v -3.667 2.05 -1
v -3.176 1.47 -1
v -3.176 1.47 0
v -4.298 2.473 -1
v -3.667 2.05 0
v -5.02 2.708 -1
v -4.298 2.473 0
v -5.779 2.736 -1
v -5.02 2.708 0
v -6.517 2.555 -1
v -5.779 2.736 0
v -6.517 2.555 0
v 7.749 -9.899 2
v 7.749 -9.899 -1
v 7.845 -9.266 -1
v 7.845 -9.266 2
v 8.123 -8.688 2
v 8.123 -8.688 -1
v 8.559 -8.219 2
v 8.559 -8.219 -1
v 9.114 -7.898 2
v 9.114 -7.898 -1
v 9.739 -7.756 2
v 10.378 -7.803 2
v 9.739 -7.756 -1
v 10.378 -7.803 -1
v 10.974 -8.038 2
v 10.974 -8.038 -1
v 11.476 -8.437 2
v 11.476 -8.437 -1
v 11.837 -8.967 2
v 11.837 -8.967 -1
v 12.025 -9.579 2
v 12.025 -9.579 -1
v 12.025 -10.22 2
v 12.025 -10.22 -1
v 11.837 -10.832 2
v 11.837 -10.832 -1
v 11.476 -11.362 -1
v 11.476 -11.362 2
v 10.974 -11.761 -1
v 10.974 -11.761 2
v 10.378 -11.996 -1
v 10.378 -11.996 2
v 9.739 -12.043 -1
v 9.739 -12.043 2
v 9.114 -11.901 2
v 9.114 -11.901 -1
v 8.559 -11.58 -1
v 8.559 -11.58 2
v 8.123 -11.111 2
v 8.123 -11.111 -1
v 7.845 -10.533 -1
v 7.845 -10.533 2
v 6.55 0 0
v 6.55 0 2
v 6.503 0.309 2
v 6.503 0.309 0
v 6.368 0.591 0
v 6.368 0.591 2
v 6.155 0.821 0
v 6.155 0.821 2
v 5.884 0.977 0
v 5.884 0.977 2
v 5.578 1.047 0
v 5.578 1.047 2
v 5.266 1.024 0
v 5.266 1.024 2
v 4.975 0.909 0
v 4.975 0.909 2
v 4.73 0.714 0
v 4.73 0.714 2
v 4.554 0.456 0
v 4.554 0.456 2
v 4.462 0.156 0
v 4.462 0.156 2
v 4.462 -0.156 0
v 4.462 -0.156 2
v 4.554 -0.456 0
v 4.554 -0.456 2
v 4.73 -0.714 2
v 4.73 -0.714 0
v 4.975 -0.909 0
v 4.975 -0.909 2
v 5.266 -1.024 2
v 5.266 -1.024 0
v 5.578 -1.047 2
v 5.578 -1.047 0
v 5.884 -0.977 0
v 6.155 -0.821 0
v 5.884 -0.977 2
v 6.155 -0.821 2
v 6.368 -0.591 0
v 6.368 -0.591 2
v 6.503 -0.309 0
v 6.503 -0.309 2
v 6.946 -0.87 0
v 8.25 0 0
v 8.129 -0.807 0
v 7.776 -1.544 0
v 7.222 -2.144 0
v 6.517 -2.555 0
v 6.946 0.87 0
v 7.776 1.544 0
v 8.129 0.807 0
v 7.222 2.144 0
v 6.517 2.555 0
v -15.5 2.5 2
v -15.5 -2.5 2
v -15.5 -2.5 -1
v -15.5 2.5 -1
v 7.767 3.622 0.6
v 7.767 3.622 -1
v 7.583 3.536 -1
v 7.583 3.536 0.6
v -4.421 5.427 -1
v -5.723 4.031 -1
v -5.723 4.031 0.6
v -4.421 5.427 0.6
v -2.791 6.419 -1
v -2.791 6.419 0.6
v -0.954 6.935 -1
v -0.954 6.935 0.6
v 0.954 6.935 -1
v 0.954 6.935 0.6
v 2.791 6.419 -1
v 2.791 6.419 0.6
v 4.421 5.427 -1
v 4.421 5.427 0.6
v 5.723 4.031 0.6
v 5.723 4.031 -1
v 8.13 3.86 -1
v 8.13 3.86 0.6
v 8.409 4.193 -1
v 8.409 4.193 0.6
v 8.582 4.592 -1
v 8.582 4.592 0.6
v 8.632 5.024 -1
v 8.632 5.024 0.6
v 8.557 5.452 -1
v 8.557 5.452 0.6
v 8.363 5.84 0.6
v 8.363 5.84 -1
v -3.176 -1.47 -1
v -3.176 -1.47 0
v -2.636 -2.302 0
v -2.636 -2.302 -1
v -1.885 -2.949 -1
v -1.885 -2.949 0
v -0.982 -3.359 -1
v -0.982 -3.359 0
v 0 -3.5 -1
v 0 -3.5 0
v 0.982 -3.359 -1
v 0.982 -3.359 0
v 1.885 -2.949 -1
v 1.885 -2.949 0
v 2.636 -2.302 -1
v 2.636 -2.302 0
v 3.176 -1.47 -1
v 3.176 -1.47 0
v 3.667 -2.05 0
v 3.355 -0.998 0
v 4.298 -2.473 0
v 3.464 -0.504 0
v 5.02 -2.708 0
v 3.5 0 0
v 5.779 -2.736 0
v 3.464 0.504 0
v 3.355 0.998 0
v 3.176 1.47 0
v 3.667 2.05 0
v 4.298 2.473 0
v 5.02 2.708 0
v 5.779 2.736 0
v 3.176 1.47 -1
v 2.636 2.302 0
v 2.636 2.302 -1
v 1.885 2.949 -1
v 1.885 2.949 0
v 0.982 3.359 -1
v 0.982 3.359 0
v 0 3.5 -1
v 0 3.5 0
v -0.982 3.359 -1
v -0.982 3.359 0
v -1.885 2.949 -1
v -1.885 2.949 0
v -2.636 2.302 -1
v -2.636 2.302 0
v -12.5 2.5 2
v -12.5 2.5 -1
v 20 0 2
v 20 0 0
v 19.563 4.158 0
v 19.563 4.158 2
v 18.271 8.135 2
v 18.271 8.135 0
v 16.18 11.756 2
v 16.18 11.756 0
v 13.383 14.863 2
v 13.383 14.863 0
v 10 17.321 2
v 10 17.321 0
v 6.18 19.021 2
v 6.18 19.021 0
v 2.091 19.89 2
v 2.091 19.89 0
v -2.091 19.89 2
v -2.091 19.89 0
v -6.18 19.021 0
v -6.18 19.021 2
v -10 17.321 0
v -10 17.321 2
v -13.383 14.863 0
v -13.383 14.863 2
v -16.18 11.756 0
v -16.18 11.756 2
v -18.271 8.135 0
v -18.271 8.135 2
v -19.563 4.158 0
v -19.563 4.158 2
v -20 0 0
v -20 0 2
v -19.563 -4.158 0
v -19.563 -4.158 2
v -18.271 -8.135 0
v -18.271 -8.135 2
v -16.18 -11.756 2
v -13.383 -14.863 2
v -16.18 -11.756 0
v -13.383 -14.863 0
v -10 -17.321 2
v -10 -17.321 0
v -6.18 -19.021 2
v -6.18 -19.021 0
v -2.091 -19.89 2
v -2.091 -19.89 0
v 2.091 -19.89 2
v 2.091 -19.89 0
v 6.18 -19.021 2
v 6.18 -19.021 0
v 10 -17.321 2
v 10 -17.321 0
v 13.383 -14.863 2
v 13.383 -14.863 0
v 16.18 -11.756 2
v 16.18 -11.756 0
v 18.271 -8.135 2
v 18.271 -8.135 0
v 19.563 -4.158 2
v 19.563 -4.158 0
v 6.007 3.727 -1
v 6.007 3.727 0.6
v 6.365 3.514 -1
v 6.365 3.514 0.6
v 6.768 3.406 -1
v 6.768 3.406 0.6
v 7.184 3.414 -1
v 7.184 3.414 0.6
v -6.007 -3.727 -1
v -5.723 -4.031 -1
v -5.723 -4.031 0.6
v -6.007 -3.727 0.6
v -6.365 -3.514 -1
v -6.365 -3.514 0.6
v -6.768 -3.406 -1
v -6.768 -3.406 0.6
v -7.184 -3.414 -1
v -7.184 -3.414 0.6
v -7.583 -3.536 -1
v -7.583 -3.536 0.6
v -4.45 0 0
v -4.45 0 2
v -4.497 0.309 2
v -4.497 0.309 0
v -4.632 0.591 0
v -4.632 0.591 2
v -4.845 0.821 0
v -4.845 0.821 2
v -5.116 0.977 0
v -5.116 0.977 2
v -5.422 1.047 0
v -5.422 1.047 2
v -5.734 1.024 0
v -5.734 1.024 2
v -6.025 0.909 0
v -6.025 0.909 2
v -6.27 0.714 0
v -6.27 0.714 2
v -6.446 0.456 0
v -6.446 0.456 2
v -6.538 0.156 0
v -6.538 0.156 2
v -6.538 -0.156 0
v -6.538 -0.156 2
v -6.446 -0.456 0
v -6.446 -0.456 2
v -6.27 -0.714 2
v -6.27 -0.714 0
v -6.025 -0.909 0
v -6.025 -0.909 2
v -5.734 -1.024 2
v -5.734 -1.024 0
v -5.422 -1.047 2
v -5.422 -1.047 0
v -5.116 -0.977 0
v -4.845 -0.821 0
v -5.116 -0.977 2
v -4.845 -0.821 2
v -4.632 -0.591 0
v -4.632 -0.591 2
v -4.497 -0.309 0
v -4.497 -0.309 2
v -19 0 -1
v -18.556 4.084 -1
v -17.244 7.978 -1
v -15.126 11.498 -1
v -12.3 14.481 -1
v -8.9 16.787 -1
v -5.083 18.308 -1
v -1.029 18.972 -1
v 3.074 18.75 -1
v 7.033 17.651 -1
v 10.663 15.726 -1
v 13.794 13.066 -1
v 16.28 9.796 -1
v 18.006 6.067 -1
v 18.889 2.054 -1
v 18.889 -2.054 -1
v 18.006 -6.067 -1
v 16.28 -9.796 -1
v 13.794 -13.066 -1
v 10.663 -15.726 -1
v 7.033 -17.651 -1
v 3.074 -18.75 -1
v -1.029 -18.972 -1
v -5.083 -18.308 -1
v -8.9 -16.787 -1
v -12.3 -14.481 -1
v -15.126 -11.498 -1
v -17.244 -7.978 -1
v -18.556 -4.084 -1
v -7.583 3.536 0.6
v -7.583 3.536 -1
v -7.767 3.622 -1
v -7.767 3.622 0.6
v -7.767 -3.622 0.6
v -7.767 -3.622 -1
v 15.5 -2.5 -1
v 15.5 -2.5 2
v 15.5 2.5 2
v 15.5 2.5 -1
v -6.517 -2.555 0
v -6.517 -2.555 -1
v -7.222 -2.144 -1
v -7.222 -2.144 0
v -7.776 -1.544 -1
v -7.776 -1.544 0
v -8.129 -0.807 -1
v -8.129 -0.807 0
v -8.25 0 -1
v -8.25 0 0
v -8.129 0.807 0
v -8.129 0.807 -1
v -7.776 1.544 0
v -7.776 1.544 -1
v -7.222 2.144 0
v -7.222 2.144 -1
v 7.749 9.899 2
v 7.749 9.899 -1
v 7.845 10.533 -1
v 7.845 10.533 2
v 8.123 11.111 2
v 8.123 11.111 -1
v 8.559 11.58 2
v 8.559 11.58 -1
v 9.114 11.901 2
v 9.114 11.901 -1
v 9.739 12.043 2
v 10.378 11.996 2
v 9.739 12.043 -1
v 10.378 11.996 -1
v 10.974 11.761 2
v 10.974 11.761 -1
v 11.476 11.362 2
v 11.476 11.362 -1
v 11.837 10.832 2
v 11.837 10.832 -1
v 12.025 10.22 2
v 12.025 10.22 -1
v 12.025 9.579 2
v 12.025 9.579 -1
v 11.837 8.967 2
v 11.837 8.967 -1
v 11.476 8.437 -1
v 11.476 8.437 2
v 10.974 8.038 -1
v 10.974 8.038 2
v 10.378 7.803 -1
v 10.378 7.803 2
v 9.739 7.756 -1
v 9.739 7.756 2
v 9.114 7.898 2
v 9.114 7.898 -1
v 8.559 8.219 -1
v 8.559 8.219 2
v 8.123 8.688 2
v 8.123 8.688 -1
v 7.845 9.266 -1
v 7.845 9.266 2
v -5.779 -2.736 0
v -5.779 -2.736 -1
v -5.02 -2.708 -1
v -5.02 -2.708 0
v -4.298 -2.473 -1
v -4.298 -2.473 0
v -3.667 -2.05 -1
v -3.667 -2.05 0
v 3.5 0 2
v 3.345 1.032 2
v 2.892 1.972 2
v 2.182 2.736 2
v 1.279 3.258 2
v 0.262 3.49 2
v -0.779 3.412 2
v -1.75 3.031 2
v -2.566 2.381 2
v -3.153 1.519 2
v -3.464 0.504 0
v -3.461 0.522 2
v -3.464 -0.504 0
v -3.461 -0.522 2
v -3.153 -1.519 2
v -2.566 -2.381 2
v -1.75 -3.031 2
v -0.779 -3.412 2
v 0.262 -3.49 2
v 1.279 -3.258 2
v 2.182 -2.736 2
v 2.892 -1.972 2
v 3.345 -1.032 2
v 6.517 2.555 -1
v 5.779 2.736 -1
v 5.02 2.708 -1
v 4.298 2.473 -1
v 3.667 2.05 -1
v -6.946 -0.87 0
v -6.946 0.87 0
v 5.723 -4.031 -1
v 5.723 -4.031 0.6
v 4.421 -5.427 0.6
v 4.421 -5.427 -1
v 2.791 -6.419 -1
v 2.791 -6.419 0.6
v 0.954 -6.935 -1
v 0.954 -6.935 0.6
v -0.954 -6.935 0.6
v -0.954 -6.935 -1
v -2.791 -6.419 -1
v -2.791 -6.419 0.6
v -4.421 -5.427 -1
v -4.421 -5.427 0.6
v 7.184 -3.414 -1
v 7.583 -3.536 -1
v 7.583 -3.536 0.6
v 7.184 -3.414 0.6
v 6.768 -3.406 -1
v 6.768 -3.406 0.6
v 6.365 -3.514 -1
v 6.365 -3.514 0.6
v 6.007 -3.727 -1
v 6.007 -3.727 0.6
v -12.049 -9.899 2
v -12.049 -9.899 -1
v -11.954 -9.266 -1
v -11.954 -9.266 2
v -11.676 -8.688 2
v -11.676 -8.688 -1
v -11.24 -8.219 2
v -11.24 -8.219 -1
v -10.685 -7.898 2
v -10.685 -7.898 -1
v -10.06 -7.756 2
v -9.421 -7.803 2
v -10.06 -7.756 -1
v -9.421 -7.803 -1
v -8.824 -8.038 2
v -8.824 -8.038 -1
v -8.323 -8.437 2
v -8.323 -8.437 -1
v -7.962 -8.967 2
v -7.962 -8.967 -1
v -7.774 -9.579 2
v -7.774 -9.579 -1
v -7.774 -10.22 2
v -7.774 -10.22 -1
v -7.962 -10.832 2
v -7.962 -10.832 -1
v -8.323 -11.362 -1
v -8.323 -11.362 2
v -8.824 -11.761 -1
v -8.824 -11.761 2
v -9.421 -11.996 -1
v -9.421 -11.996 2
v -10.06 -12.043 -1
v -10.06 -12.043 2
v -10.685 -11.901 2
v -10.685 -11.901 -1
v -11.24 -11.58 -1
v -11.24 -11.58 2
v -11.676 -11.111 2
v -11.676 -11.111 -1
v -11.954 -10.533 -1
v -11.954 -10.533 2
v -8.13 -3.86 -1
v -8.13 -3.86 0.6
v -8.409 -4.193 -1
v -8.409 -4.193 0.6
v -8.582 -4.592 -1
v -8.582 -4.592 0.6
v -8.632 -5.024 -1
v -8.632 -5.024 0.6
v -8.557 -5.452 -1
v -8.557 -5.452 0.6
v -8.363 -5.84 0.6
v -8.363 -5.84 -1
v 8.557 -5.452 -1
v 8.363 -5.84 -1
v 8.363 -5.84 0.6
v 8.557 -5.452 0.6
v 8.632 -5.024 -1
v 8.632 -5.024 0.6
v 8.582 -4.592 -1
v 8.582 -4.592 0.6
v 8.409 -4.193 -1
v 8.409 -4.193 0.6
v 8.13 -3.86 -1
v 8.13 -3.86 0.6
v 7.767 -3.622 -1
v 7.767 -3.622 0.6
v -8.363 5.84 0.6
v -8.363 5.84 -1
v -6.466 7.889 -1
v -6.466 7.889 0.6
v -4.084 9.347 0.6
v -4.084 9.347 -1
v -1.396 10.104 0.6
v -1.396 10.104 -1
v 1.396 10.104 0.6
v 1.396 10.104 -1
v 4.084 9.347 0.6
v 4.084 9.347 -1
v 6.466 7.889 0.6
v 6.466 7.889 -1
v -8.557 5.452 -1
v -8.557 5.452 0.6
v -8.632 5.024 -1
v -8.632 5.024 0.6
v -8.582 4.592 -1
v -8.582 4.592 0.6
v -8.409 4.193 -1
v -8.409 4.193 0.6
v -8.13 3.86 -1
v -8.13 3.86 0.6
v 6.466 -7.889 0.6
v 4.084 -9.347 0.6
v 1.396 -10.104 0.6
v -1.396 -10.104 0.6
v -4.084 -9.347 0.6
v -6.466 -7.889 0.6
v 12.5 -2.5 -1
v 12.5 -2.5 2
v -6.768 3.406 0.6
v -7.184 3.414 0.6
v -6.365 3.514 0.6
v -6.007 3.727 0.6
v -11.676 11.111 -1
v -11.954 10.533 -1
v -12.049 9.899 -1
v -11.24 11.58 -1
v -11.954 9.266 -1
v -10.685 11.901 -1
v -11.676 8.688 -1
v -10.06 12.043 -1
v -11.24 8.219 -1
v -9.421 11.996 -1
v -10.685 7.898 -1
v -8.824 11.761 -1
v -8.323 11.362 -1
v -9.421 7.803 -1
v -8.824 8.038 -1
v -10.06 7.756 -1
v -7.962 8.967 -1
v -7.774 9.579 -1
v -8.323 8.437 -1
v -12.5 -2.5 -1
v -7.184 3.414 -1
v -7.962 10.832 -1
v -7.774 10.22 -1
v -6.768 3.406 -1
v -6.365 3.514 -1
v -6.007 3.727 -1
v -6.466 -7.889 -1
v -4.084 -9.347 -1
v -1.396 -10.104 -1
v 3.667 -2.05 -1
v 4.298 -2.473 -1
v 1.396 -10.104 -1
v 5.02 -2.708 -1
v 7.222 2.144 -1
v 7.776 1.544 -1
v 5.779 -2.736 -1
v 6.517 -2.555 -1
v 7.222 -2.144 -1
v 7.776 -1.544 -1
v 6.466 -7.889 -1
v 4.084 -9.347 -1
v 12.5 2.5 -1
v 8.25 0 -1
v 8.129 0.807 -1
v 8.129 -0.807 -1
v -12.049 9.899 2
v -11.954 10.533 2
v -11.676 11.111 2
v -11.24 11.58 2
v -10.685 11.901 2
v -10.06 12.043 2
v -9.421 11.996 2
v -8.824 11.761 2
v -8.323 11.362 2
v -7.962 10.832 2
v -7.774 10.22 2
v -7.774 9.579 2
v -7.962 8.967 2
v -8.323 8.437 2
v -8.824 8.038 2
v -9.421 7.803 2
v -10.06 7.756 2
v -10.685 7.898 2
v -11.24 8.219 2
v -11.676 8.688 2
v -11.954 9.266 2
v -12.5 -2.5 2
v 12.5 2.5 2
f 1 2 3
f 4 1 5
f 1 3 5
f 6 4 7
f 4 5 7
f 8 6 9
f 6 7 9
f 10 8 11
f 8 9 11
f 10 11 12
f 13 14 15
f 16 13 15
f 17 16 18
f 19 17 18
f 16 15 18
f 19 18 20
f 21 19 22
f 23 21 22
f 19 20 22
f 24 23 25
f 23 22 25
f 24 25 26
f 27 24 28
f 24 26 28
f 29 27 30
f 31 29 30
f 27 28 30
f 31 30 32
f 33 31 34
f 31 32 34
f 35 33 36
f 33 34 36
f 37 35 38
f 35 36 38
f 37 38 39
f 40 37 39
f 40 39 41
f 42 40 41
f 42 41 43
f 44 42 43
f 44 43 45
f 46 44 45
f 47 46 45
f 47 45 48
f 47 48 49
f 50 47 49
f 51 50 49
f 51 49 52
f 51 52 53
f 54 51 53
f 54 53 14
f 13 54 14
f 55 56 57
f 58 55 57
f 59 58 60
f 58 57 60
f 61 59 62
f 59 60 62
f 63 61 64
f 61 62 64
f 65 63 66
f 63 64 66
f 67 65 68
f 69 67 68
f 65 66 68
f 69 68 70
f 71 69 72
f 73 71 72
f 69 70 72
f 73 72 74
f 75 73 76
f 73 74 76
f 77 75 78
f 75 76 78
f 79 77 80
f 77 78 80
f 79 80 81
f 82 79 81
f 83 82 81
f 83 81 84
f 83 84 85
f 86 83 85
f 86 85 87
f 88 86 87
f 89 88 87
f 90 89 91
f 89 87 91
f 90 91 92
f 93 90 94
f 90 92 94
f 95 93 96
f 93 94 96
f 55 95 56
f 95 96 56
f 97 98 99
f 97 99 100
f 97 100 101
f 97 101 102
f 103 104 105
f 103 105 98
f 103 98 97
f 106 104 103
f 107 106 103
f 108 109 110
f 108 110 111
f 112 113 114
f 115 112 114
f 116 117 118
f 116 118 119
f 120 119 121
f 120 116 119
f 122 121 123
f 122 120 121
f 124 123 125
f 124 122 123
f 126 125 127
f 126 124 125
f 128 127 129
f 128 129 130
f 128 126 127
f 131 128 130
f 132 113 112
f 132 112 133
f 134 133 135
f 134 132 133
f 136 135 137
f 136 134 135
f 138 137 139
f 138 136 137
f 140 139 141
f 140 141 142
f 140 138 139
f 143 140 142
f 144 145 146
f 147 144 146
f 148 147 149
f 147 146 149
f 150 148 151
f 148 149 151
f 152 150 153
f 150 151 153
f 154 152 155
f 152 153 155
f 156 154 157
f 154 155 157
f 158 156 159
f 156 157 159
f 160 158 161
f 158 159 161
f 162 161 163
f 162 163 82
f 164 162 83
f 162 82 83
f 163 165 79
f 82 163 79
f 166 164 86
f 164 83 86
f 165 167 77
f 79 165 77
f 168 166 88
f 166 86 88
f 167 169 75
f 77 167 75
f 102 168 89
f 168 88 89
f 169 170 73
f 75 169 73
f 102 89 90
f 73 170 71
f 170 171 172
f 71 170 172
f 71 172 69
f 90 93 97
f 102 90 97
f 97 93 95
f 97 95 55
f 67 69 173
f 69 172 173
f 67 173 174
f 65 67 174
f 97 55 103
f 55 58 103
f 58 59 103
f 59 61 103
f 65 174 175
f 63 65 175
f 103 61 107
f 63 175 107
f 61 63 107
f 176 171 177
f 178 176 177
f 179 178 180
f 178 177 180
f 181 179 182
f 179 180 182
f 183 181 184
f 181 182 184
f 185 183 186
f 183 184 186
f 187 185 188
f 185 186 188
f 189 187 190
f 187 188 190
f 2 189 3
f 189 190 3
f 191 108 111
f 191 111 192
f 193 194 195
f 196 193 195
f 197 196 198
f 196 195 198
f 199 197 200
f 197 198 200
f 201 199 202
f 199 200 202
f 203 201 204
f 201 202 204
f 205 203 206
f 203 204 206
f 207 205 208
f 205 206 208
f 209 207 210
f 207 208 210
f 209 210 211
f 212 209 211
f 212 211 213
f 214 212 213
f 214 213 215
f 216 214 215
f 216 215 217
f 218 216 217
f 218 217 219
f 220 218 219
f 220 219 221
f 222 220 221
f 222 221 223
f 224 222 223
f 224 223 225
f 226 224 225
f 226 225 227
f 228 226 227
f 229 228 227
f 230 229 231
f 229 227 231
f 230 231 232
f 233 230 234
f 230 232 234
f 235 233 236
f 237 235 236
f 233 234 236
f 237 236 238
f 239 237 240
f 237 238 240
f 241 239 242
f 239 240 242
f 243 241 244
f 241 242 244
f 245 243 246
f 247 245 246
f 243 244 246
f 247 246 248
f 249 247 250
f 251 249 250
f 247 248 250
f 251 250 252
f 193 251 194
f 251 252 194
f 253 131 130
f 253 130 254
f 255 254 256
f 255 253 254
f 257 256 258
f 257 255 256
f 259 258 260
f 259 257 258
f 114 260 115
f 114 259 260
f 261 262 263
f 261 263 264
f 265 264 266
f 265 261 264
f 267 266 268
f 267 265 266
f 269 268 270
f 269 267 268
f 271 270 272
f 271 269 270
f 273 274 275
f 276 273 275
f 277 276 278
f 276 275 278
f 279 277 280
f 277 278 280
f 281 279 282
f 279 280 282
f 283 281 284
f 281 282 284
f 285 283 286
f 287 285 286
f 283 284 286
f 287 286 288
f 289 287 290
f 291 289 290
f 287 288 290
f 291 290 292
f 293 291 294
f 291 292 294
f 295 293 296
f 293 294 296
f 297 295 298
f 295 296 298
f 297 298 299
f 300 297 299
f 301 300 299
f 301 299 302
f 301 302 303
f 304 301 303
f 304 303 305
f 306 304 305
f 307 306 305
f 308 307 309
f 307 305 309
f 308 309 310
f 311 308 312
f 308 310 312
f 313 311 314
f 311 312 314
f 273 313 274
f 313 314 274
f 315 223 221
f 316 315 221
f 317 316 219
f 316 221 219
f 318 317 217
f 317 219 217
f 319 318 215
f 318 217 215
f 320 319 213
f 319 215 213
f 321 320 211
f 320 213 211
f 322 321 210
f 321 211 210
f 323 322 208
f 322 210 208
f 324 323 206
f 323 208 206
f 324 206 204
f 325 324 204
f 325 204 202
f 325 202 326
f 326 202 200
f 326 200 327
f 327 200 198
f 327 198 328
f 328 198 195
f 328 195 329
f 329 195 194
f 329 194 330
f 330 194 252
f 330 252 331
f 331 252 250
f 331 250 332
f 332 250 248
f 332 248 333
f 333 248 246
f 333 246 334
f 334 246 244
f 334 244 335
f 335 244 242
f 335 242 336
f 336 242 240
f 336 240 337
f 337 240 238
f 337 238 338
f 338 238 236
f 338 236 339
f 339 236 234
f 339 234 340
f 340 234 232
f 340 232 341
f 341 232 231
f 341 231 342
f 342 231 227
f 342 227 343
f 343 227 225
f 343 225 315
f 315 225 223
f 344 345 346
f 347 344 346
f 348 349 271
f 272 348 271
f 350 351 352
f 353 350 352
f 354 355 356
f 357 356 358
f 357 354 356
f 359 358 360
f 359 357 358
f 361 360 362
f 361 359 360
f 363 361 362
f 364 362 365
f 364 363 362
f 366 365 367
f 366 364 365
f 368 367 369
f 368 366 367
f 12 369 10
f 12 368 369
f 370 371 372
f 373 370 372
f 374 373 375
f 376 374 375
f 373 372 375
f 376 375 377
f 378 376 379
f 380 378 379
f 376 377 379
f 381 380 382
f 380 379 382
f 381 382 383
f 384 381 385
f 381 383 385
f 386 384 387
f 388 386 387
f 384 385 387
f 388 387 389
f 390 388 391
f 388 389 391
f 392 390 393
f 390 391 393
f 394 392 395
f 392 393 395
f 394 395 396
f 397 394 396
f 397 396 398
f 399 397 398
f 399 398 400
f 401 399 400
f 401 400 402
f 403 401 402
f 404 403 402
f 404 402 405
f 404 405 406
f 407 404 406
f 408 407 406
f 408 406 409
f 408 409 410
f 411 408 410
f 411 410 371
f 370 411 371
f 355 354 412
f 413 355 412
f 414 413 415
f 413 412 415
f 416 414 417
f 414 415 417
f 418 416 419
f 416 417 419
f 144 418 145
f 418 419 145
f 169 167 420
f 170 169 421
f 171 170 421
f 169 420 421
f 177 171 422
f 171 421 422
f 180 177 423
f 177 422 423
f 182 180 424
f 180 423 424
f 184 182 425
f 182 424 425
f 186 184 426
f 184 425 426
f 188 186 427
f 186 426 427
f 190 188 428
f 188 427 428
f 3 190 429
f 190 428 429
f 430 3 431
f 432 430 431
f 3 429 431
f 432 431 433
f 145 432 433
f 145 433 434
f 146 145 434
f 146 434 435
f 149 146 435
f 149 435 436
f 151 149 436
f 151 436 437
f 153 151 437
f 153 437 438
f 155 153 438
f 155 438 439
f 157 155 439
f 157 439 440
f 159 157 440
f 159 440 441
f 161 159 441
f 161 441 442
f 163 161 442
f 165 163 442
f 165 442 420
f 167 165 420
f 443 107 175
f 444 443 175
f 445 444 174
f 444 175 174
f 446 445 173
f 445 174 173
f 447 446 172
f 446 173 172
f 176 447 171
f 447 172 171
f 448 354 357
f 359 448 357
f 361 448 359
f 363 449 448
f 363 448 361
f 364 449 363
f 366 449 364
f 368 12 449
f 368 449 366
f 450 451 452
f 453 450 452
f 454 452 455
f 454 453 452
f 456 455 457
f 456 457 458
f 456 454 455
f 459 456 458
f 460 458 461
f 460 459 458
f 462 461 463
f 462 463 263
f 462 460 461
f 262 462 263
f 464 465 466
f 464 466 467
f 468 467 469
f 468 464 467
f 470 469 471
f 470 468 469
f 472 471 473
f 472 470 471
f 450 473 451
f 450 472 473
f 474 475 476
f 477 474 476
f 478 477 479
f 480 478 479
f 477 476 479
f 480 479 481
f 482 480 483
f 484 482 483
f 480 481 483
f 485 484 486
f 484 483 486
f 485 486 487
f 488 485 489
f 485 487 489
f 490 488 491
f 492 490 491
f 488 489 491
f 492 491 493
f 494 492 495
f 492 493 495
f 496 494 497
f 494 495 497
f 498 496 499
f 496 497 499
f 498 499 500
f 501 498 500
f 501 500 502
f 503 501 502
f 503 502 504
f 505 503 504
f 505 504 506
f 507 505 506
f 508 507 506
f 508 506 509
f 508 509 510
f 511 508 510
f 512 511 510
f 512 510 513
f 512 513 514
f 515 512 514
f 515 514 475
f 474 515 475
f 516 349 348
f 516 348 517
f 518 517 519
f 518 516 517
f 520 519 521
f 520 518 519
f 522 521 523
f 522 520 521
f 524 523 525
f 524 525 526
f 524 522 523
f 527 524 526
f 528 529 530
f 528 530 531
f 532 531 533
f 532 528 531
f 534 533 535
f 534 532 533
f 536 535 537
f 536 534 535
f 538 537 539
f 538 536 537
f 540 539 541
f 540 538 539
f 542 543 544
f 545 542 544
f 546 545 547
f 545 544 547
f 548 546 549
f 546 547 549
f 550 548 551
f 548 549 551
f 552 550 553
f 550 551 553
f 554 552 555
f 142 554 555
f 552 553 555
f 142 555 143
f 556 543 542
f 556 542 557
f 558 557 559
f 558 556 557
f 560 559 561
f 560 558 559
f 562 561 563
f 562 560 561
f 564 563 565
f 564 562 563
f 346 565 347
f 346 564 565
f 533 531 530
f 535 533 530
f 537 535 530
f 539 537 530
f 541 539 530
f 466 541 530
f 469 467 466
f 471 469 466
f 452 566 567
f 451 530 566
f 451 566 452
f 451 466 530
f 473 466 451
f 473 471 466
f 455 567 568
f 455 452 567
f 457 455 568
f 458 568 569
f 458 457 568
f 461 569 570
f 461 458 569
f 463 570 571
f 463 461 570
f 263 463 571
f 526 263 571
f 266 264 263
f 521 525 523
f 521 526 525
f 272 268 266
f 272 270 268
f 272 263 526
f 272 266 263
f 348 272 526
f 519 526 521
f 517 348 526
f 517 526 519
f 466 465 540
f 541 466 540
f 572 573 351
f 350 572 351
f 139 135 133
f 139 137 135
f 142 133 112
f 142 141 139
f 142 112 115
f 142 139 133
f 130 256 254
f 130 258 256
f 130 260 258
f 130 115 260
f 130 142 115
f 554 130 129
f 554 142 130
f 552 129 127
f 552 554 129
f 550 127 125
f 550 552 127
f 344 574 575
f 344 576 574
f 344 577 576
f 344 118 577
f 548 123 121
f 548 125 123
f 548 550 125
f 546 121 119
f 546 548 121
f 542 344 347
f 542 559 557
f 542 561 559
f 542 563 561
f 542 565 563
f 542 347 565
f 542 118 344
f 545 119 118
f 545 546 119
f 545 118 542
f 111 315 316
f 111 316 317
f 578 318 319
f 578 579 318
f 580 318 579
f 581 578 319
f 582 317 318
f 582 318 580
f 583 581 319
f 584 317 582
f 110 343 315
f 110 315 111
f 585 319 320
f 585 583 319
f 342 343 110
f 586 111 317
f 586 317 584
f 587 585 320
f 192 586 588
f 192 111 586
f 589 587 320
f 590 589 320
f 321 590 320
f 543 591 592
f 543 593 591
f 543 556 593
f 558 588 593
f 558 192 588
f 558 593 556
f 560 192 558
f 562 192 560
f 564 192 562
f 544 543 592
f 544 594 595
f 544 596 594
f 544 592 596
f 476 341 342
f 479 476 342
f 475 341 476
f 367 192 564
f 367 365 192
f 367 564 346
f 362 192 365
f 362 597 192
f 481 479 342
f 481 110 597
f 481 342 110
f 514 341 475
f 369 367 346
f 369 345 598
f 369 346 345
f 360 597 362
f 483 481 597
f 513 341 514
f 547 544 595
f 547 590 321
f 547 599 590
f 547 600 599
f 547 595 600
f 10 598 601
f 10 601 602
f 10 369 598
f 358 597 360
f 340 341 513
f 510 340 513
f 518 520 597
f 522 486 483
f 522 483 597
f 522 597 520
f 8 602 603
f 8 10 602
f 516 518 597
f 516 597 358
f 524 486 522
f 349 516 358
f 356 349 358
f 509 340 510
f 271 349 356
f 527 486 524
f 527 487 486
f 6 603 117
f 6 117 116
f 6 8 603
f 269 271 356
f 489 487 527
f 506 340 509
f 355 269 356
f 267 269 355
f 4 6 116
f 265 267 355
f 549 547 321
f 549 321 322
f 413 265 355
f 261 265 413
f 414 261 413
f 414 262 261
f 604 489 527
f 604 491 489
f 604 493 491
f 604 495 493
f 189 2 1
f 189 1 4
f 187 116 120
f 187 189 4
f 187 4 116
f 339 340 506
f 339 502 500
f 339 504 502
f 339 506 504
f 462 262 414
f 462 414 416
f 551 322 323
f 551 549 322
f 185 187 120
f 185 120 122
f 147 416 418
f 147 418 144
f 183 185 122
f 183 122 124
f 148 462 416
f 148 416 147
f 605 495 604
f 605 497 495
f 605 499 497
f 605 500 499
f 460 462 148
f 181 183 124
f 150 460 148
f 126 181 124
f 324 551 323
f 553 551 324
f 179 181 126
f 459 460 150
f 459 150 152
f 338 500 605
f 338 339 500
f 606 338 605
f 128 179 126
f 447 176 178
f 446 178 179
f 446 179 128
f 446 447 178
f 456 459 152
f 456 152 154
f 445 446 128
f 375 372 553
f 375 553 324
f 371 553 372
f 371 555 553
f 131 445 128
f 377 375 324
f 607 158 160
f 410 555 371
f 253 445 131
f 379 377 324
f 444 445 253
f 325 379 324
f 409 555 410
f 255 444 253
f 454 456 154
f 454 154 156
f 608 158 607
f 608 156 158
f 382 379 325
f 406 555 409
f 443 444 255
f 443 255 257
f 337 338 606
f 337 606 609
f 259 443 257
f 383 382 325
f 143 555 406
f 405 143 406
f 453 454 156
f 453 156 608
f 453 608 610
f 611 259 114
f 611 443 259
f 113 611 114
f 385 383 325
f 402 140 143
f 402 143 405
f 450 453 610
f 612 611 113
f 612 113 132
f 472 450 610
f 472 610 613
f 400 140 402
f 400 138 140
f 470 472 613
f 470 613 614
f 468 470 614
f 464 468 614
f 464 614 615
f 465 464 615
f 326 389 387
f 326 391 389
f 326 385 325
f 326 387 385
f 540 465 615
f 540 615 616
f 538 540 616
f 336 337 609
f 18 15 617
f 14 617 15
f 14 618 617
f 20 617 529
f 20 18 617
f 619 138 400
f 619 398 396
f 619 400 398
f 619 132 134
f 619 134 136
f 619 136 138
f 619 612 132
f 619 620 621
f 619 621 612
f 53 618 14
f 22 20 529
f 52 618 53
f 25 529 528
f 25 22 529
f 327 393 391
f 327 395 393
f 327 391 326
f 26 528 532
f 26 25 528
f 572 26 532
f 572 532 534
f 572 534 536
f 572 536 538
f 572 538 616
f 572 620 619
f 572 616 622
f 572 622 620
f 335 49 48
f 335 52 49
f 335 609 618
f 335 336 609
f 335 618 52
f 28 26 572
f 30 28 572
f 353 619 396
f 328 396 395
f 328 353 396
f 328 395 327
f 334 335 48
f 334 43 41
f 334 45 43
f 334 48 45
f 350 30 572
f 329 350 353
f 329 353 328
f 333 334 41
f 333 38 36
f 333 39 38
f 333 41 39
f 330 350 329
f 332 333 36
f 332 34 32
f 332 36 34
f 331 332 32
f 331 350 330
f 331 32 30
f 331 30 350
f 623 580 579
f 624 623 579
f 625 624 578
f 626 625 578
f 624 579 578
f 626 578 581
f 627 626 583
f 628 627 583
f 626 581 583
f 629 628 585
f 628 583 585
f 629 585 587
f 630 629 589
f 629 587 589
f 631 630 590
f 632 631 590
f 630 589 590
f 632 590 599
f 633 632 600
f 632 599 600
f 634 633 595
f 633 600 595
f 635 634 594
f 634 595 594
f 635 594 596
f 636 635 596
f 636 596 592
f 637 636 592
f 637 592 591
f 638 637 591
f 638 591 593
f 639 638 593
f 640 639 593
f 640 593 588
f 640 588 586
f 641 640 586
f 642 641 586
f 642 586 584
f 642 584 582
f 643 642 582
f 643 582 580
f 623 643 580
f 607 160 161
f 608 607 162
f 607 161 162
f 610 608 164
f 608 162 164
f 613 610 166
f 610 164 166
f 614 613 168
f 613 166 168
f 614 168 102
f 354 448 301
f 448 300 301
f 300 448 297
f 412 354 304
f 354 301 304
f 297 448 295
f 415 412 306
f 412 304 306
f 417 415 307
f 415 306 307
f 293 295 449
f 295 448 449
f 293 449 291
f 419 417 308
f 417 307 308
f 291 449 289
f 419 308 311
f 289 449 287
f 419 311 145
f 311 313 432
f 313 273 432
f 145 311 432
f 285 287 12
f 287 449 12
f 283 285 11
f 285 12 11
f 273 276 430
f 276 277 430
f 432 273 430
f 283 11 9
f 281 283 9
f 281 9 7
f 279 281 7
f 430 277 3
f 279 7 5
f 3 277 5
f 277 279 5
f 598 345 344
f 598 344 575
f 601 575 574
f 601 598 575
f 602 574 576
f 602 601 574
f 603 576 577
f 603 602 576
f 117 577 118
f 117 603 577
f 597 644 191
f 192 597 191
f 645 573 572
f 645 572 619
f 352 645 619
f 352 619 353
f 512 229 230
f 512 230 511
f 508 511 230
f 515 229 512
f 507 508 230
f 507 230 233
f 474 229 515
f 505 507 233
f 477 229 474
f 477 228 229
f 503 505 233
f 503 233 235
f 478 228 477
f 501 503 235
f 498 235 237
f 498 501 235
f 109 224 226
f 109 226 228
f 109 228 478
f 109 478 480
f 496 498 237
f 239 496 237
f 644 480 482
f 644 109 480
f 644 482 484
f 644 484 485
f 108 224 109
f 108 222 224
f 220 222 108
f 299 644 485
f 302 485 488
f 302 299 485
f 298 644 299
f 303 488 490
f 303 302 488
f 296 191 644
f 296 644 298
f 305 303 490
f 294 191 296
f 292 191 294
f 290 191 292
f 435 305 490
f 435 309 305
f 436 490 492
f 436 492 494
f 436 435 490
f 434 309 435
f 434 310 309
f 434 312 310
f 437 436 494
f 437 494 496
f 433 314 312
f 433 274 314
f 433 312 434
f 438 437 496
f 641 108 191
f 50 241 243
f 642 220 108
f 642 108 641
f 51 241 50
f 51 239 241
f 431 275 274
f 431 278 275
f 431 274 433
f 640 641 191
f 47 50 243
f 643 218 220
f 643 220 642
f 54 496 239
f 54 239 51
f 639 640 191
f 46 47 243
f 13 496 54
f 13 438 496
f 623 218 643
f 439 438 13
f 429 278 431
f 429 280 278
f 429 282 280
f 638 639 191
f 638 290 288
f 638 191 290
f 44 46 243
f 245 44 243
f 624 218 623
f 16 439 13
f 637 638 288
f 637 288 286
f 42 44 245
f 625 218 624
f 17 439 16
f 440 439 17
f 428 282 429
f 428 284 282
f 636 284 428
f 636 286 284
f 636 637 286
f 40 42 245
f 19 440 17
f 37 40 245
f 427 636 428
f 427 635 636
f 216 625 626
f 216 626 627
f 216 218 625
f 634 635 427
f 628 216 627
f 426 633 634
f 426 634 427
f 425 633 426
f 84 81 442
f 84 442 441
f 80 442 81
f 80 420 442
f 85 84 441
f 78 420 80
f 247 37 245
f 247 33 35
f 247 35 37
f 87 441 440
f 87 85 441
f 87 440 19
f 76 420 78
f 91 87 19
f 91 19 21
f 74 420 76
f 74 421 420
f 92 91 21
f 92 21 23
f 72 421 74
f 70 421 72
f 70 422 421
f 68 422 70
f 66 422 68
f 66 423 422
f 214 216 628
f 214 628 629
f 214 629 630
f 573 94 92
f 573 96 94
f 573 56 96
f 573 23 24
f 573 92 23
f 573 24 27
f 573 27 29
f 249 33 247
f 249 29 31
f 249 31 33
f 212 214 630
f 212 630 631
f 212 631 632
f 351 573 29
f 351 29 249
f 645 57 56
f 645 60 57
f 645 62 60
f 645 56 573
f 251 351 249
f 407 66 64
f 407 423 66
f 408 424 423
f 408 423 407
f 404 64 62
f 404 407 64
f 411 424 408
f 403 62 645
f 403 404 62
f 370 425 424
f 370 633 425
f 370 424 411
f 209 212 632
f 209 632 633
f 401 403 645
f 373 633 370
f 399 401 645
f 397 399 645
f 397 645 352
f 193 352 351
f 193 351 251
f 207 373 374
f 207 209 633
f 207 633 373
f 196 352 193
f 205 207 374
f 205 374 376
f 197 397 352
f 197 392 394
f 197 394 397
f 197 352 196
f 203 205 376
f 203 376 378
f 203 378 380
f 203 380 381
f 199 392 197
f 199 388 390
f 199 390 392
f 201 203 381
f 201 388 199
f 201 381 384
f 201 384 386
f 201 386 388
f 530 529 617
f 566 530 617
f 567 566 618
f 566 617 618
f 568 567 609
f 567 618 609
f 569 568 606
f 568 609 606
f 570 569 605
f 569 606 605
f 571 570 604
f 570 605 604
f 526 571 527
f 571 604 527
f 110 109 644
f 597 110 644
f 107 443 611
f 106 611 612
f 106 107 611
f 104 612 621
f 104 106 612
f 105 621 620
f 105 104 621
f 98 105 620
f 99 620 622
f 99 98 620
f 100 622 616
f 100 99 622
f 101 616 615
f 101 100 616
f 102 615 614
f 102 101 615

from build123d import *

# Parameters (mm, degrees)
SKETCH_1_R               = 20
EXTRUDE_1_DEPTH          = 2
SKETCH_2_R               = 3.5
CUT_EXTRUDE_1_DEPTH      = 2
SKETCH_3_R               = 1.05
CUT_EXTRUDE_2_DEPTH      = 2
EXTRUDE_START            = 1
SKETCH_5_R               = 20
SKETCH_5_R_2             = 8.25
EXTRUDE_3_DEPTH          = 1
EXTRUDE_4_DEPTH          = 1
SKETCH_9_R               = 10.2
SKETCH_9_R_2             = 7
CUT_EXTRUDE_3_DEPTH      = 1.6
EXTRUDE_START_2          = 1.6
EXTRUDE_5_DEPTH          = 1.6
PATTERN_CIRCULAR_2_COUNT = 2
PATTERN_CIRCULAR_2_ANGLE = 180
SKETCH_13_R              = 2.75
CUT_EXTRUDE_4_DEPTH      = 1.6
FILLET_1_R               = 1.5
SKETCH_14_R              = 2.15
CUT_EXTRUDE_5_DEPTH      = 10
SKETCH_15_W              = 3
SKETCH_15_H              = 5
CUT_EXTRUDE_6_DEPTH      = 10
CHAMFER_1_SIZE           = 1


# Some blends are built 0.0001 mm under size
with BuildPart() as part:
    # 草图1 → 凸台-拉伸1 (new body)
    with BuildSketch(Plane.XY):
        Circle(SKETCH_1_R)
    extrude(amount=EXTRUDE_1_DEPTH)

    # 草图2 → 切除-拉伸1 (cut)
    with BuildSketch(Plane.XY.offset(2)):
        Circle(SKETCH_2_R)
    extrude(amount=-CUT_EXTRUDE_1_DEPTH, mode=Mode.SUBTRACT)

    # 草图3 → 切除-拉伸2 (cut)
    with BuildSketch(Plane.XY.offset(2)):
        with Locations((-5.5, 0)):
            Circle(SKETCH_3_R)
        with Locations((5.5, 0)):
            Circle(SKETCH_3_R)
    extrude(amount=-CUT_EXTRUDE_2_DEPTH, mode=Mode.SUBTRACT)

    # 草图5 → 凸台-拉伸3 (add)
    with BuildSketch(Plane(origin=(0, 0, 0), x_dir=(-1, 0, 0), z_dir=(0, 0, -1)).offset(EXTRUDE_START)):
        Circle(SKETCH_5_R)
        Circle(SKETCH_5_R_2, mode=Mode.SUBTRACT)
    extrude(amount=-EXTRUDE_3_DEPTH)

    # 草图8 → 凸台-拉伸4 (add)
    with BuildSketch(Plane(origin=(0, 0, 0), x_dir=(-1, 0, 0), z_dir=(0, 0, -1))):
        with BuildLine():
            ThreePointArc((3.176136364, 1.470427761), (6.265465545, 2.641318326), (8.25, 0))
            ThreePointArc((8.25, 0), (0, 8.25), (-8.25, 0))
            ThreePointArc((-8.25, 0), (-6.265465545, 2.641318326), (-3.176136364, 1.470427761))
            ThreePointArc((-3.176136364, 1.470427761), (0, 3.5), (3.176136364, 1.470427761))
        make_face()
        with BuildLine():
            ThreePointArc((-8.25, 0), (0, -8.25), (8.25, 0))
            ThreePointArc((8.25, 0), (6.265465545, -2.641318326), (3.176136364, -1.470427761))
            ThreePointArc((3.176136364, -1.470427761), (0, -3.5), (-3.176136364, -1.470427761))
            ThreePointArc((-3.176136364, -1.470427761), (-6.265465545, -2.641318326), (-8.25, 0))
        make_face()
    extrude(amount=EXTRUDE_4_DEPTH)

    # 草图9 → 切除-拉伸3 (cut)
    with BuildSketch(Plane(origin=(0, 0, -1), x_dir=(-1, 0, 0), z_dir=(0, 0, -1))):
        Circle(SKETCH_9_R)
        Circle(SKETCH_9_R_2, mode=Mode.SUBTRACT)
    extrude(amount=-CUT_EXTRUDE_3_DEPTH, mode=Mode.SUBTRACT)

    # 草图12 → 凸台-拉伸5 (add)
    with BuildSketch(Plane(origin=(0, 0, 0.6), x_dir=(-1, 0, 0), z_dir=(0, 0, -1)).offset(EXTRUDE_START_2)):
        with BuildLine():
            Line((6.344154509, 2.958327832), (9.244339428, 4.31070627))
            ThreePointArc((9.244339428, 4.31070627), (10.2, 0), (9.244339428, -4.31070627))
            Line((9.244339428, -4.31070627), (6.344154509, -2.958327832))
            ThreePointArc((6.344154509, -2.958327832), (7, 0), (6.344154509, 2.958327832))
        make_face()
    extrude_5 = extrude(amount=-EXTRUDE_5_DEPTH)

    # 阵列(圆周)2: 凸台-拉伸5 ×2 about axis
    pattern_circular_2_axis = Axis((0, 0, 0), (0, 0, 1))
    for i in range(1, PATTERN_CIRCULAR_2_COUNT):
        add(extrude_5.rotate(pattern_circular_2_axis, i * PATTERN_CIRCULAR_2_ANGLE / (PATTERN_CIRCULAR_2_COUNT - 1)))

    # 草图13 → 切除-拉伸4 (cut)
    with BuildSketch(Plane(origin=(0, 0, 0), x_dir=(-1, 0, 0), z_dir=(0, 0, -1))):
        with Locations((5.5, 0)):
            Circle(SKETCH_13_R)
        with Locations((-5.5, 0)):
            Circle(SKETCH_13_R)
    extrude(amount=CUT_EXTRUDE_4_DEPTH, mode=Mode.SUBTRACT)

    # 圆角1
    # the kernel refuses this fillet: 1.5 mm, written as the material it adds along each edge
    with BuildSketch(Plane(origin=(9.244339428, 4.31070627, -1), x_dir=(-0.49945721190303094, 0.8663385559225971, 0), z_dir=(0, 0, 1)), Plane(origin=(-9.244339428, -4.31070627, -1), x_dir=(0.49945721190302483, -0.8663385559226006, 0), z_dir=(0, 0, 1))) as fillet_1_piece_1:
        with BuildLine():
            CenterArc((1.635444705, 1.494373677), FILLET_1_R, 175.035904079, 99.928191842)
            Line((0.141071027, 1.624170876), (0, 0))
            ThreePointArc((0, 0), (0.882620952, -0.038258995), (1.765241903, 0))
        make_face()
    extrude(amount=1.6)
    with BuildSketch(Plane(origin=(9.244339428, -4.31070627, -1), x_dir=(-0.49945721190301884, -0.8663385559226039, 0), z_dir=(0, 0, 1)), Plane(origin=(-9.244339428, 4.31070627, -1), x_dir=(0.4994572119030254, 0.8663385559226003, 0), z_dir=(0, 0, 1))) as fillet_1_piece_2:
        with BuildLine():
            CenterArc((1.635444705, -1.494373677), FILLET_1_R, 85.035904079, 99.928191842)
            Line((0.141071027, -1.624170876), (0, 0))
            ThreePointArc((0, 0), (0.882620952, 0.038258995), (1.765241903, 0))
        make_face()
    extrude(amount=1.6)
    with BuildSketch(Plane(origin=(-6.344154509, 2.958327832, -1), x_dir=(-0.9063077870366493, 0.42261826174070083, 0), z_dir=(0, 0, 1)), Plane(origin=(6.344154509, -2.958327832, -1), x_dir=(0.9063077870366523, -0.4226182617406945, 0), z_dir=(0, 0, 1))) as fillet_1_piece_3:
        with BuildLine():
            CenterArc((1.366600265, -1.5), FILLET_1_R, 90, 79.835751378)
            ThreePointArc((-0.109858605, -1.235294118), (-0.027518743, -0.620084766), (0, 0))
            Line((0, 0), (1.366600265, 0))
        make_face()
    extrude(amount=1.6)
    with BuildSketch(Plane(origin=(-6.344154509, -2.958327832, -1), x_dir=(-0.9063077870366493, -0.4226182617407009, 0), z_dir=(0, 0, 1)), Plane(origin=(6.344154509, 2.958327832, -1), x_dir=(0.9063077870366462, 0.42261826174070743, 0), z_dir=(0, 0, 1))) as fillet_1_piece_4:
        with BuildLine():
            CenterArc((1.366600265, 1.5), FILLET_1_R, 190.164248622, 79.835751378)
            ThreePointArc((-0.109858605, 1.235294118), (-0.027518743, 0.620084766), (0, 0))
            Line((0, 0), (1.366600265, 0))
        make_face()
    extrude(amount=1.6)

    # 草图14 → 切除-拉伸5 (cut)
    with BuildSketch(Plane(origin=(0, 0, -1), x_dir=(-1, 0, 0), z_dir=(0, 0, -1))):
        with Locations((9.899494937, -9.899494937)):
            Circle(SKETCH_14_R)
        with Locations((-9.899494937, -9.899494937)):
            Circle(SKETCH_14_R)
        with Locations((-9.899494937, 9.899494937)):
            Circle(SKETCH_14_R)
        with Locations((9.899494937, 9.899494937)):
            Circle(SKETCH_14_R)
    extrude(amount=-CUT_EXTRUDE_5_DEPTH, mode=Mode.SUBTRACT)

    # 草图15 → 切除-拉伸6 (cut)
    with BuildSketch(Plane.XY.offset(2)):
        with Locations((-14, 0)):
            Rectangle(SKETCH_15_W, SKETCH_15_H)
        with Locations((14, 0)):
            Rectangle(SKETCH_15_W, SKETCH_15_H)
    extrude(amount=-CUT_EXTRUDE_6_DEPTH, mode=Mode.SUBTRACT)

    # 倒角1
    chamfer_1_edges = [part.edges().sort_by_distance(p)[0] for p in [
        (20, 0, -1),
    ]]
    chamfer(chamfer_1_edges, length=CHAMFER_1_SIZE - 0.0001)  # a hair under: the kernel refuses the full size


solid = part.part
